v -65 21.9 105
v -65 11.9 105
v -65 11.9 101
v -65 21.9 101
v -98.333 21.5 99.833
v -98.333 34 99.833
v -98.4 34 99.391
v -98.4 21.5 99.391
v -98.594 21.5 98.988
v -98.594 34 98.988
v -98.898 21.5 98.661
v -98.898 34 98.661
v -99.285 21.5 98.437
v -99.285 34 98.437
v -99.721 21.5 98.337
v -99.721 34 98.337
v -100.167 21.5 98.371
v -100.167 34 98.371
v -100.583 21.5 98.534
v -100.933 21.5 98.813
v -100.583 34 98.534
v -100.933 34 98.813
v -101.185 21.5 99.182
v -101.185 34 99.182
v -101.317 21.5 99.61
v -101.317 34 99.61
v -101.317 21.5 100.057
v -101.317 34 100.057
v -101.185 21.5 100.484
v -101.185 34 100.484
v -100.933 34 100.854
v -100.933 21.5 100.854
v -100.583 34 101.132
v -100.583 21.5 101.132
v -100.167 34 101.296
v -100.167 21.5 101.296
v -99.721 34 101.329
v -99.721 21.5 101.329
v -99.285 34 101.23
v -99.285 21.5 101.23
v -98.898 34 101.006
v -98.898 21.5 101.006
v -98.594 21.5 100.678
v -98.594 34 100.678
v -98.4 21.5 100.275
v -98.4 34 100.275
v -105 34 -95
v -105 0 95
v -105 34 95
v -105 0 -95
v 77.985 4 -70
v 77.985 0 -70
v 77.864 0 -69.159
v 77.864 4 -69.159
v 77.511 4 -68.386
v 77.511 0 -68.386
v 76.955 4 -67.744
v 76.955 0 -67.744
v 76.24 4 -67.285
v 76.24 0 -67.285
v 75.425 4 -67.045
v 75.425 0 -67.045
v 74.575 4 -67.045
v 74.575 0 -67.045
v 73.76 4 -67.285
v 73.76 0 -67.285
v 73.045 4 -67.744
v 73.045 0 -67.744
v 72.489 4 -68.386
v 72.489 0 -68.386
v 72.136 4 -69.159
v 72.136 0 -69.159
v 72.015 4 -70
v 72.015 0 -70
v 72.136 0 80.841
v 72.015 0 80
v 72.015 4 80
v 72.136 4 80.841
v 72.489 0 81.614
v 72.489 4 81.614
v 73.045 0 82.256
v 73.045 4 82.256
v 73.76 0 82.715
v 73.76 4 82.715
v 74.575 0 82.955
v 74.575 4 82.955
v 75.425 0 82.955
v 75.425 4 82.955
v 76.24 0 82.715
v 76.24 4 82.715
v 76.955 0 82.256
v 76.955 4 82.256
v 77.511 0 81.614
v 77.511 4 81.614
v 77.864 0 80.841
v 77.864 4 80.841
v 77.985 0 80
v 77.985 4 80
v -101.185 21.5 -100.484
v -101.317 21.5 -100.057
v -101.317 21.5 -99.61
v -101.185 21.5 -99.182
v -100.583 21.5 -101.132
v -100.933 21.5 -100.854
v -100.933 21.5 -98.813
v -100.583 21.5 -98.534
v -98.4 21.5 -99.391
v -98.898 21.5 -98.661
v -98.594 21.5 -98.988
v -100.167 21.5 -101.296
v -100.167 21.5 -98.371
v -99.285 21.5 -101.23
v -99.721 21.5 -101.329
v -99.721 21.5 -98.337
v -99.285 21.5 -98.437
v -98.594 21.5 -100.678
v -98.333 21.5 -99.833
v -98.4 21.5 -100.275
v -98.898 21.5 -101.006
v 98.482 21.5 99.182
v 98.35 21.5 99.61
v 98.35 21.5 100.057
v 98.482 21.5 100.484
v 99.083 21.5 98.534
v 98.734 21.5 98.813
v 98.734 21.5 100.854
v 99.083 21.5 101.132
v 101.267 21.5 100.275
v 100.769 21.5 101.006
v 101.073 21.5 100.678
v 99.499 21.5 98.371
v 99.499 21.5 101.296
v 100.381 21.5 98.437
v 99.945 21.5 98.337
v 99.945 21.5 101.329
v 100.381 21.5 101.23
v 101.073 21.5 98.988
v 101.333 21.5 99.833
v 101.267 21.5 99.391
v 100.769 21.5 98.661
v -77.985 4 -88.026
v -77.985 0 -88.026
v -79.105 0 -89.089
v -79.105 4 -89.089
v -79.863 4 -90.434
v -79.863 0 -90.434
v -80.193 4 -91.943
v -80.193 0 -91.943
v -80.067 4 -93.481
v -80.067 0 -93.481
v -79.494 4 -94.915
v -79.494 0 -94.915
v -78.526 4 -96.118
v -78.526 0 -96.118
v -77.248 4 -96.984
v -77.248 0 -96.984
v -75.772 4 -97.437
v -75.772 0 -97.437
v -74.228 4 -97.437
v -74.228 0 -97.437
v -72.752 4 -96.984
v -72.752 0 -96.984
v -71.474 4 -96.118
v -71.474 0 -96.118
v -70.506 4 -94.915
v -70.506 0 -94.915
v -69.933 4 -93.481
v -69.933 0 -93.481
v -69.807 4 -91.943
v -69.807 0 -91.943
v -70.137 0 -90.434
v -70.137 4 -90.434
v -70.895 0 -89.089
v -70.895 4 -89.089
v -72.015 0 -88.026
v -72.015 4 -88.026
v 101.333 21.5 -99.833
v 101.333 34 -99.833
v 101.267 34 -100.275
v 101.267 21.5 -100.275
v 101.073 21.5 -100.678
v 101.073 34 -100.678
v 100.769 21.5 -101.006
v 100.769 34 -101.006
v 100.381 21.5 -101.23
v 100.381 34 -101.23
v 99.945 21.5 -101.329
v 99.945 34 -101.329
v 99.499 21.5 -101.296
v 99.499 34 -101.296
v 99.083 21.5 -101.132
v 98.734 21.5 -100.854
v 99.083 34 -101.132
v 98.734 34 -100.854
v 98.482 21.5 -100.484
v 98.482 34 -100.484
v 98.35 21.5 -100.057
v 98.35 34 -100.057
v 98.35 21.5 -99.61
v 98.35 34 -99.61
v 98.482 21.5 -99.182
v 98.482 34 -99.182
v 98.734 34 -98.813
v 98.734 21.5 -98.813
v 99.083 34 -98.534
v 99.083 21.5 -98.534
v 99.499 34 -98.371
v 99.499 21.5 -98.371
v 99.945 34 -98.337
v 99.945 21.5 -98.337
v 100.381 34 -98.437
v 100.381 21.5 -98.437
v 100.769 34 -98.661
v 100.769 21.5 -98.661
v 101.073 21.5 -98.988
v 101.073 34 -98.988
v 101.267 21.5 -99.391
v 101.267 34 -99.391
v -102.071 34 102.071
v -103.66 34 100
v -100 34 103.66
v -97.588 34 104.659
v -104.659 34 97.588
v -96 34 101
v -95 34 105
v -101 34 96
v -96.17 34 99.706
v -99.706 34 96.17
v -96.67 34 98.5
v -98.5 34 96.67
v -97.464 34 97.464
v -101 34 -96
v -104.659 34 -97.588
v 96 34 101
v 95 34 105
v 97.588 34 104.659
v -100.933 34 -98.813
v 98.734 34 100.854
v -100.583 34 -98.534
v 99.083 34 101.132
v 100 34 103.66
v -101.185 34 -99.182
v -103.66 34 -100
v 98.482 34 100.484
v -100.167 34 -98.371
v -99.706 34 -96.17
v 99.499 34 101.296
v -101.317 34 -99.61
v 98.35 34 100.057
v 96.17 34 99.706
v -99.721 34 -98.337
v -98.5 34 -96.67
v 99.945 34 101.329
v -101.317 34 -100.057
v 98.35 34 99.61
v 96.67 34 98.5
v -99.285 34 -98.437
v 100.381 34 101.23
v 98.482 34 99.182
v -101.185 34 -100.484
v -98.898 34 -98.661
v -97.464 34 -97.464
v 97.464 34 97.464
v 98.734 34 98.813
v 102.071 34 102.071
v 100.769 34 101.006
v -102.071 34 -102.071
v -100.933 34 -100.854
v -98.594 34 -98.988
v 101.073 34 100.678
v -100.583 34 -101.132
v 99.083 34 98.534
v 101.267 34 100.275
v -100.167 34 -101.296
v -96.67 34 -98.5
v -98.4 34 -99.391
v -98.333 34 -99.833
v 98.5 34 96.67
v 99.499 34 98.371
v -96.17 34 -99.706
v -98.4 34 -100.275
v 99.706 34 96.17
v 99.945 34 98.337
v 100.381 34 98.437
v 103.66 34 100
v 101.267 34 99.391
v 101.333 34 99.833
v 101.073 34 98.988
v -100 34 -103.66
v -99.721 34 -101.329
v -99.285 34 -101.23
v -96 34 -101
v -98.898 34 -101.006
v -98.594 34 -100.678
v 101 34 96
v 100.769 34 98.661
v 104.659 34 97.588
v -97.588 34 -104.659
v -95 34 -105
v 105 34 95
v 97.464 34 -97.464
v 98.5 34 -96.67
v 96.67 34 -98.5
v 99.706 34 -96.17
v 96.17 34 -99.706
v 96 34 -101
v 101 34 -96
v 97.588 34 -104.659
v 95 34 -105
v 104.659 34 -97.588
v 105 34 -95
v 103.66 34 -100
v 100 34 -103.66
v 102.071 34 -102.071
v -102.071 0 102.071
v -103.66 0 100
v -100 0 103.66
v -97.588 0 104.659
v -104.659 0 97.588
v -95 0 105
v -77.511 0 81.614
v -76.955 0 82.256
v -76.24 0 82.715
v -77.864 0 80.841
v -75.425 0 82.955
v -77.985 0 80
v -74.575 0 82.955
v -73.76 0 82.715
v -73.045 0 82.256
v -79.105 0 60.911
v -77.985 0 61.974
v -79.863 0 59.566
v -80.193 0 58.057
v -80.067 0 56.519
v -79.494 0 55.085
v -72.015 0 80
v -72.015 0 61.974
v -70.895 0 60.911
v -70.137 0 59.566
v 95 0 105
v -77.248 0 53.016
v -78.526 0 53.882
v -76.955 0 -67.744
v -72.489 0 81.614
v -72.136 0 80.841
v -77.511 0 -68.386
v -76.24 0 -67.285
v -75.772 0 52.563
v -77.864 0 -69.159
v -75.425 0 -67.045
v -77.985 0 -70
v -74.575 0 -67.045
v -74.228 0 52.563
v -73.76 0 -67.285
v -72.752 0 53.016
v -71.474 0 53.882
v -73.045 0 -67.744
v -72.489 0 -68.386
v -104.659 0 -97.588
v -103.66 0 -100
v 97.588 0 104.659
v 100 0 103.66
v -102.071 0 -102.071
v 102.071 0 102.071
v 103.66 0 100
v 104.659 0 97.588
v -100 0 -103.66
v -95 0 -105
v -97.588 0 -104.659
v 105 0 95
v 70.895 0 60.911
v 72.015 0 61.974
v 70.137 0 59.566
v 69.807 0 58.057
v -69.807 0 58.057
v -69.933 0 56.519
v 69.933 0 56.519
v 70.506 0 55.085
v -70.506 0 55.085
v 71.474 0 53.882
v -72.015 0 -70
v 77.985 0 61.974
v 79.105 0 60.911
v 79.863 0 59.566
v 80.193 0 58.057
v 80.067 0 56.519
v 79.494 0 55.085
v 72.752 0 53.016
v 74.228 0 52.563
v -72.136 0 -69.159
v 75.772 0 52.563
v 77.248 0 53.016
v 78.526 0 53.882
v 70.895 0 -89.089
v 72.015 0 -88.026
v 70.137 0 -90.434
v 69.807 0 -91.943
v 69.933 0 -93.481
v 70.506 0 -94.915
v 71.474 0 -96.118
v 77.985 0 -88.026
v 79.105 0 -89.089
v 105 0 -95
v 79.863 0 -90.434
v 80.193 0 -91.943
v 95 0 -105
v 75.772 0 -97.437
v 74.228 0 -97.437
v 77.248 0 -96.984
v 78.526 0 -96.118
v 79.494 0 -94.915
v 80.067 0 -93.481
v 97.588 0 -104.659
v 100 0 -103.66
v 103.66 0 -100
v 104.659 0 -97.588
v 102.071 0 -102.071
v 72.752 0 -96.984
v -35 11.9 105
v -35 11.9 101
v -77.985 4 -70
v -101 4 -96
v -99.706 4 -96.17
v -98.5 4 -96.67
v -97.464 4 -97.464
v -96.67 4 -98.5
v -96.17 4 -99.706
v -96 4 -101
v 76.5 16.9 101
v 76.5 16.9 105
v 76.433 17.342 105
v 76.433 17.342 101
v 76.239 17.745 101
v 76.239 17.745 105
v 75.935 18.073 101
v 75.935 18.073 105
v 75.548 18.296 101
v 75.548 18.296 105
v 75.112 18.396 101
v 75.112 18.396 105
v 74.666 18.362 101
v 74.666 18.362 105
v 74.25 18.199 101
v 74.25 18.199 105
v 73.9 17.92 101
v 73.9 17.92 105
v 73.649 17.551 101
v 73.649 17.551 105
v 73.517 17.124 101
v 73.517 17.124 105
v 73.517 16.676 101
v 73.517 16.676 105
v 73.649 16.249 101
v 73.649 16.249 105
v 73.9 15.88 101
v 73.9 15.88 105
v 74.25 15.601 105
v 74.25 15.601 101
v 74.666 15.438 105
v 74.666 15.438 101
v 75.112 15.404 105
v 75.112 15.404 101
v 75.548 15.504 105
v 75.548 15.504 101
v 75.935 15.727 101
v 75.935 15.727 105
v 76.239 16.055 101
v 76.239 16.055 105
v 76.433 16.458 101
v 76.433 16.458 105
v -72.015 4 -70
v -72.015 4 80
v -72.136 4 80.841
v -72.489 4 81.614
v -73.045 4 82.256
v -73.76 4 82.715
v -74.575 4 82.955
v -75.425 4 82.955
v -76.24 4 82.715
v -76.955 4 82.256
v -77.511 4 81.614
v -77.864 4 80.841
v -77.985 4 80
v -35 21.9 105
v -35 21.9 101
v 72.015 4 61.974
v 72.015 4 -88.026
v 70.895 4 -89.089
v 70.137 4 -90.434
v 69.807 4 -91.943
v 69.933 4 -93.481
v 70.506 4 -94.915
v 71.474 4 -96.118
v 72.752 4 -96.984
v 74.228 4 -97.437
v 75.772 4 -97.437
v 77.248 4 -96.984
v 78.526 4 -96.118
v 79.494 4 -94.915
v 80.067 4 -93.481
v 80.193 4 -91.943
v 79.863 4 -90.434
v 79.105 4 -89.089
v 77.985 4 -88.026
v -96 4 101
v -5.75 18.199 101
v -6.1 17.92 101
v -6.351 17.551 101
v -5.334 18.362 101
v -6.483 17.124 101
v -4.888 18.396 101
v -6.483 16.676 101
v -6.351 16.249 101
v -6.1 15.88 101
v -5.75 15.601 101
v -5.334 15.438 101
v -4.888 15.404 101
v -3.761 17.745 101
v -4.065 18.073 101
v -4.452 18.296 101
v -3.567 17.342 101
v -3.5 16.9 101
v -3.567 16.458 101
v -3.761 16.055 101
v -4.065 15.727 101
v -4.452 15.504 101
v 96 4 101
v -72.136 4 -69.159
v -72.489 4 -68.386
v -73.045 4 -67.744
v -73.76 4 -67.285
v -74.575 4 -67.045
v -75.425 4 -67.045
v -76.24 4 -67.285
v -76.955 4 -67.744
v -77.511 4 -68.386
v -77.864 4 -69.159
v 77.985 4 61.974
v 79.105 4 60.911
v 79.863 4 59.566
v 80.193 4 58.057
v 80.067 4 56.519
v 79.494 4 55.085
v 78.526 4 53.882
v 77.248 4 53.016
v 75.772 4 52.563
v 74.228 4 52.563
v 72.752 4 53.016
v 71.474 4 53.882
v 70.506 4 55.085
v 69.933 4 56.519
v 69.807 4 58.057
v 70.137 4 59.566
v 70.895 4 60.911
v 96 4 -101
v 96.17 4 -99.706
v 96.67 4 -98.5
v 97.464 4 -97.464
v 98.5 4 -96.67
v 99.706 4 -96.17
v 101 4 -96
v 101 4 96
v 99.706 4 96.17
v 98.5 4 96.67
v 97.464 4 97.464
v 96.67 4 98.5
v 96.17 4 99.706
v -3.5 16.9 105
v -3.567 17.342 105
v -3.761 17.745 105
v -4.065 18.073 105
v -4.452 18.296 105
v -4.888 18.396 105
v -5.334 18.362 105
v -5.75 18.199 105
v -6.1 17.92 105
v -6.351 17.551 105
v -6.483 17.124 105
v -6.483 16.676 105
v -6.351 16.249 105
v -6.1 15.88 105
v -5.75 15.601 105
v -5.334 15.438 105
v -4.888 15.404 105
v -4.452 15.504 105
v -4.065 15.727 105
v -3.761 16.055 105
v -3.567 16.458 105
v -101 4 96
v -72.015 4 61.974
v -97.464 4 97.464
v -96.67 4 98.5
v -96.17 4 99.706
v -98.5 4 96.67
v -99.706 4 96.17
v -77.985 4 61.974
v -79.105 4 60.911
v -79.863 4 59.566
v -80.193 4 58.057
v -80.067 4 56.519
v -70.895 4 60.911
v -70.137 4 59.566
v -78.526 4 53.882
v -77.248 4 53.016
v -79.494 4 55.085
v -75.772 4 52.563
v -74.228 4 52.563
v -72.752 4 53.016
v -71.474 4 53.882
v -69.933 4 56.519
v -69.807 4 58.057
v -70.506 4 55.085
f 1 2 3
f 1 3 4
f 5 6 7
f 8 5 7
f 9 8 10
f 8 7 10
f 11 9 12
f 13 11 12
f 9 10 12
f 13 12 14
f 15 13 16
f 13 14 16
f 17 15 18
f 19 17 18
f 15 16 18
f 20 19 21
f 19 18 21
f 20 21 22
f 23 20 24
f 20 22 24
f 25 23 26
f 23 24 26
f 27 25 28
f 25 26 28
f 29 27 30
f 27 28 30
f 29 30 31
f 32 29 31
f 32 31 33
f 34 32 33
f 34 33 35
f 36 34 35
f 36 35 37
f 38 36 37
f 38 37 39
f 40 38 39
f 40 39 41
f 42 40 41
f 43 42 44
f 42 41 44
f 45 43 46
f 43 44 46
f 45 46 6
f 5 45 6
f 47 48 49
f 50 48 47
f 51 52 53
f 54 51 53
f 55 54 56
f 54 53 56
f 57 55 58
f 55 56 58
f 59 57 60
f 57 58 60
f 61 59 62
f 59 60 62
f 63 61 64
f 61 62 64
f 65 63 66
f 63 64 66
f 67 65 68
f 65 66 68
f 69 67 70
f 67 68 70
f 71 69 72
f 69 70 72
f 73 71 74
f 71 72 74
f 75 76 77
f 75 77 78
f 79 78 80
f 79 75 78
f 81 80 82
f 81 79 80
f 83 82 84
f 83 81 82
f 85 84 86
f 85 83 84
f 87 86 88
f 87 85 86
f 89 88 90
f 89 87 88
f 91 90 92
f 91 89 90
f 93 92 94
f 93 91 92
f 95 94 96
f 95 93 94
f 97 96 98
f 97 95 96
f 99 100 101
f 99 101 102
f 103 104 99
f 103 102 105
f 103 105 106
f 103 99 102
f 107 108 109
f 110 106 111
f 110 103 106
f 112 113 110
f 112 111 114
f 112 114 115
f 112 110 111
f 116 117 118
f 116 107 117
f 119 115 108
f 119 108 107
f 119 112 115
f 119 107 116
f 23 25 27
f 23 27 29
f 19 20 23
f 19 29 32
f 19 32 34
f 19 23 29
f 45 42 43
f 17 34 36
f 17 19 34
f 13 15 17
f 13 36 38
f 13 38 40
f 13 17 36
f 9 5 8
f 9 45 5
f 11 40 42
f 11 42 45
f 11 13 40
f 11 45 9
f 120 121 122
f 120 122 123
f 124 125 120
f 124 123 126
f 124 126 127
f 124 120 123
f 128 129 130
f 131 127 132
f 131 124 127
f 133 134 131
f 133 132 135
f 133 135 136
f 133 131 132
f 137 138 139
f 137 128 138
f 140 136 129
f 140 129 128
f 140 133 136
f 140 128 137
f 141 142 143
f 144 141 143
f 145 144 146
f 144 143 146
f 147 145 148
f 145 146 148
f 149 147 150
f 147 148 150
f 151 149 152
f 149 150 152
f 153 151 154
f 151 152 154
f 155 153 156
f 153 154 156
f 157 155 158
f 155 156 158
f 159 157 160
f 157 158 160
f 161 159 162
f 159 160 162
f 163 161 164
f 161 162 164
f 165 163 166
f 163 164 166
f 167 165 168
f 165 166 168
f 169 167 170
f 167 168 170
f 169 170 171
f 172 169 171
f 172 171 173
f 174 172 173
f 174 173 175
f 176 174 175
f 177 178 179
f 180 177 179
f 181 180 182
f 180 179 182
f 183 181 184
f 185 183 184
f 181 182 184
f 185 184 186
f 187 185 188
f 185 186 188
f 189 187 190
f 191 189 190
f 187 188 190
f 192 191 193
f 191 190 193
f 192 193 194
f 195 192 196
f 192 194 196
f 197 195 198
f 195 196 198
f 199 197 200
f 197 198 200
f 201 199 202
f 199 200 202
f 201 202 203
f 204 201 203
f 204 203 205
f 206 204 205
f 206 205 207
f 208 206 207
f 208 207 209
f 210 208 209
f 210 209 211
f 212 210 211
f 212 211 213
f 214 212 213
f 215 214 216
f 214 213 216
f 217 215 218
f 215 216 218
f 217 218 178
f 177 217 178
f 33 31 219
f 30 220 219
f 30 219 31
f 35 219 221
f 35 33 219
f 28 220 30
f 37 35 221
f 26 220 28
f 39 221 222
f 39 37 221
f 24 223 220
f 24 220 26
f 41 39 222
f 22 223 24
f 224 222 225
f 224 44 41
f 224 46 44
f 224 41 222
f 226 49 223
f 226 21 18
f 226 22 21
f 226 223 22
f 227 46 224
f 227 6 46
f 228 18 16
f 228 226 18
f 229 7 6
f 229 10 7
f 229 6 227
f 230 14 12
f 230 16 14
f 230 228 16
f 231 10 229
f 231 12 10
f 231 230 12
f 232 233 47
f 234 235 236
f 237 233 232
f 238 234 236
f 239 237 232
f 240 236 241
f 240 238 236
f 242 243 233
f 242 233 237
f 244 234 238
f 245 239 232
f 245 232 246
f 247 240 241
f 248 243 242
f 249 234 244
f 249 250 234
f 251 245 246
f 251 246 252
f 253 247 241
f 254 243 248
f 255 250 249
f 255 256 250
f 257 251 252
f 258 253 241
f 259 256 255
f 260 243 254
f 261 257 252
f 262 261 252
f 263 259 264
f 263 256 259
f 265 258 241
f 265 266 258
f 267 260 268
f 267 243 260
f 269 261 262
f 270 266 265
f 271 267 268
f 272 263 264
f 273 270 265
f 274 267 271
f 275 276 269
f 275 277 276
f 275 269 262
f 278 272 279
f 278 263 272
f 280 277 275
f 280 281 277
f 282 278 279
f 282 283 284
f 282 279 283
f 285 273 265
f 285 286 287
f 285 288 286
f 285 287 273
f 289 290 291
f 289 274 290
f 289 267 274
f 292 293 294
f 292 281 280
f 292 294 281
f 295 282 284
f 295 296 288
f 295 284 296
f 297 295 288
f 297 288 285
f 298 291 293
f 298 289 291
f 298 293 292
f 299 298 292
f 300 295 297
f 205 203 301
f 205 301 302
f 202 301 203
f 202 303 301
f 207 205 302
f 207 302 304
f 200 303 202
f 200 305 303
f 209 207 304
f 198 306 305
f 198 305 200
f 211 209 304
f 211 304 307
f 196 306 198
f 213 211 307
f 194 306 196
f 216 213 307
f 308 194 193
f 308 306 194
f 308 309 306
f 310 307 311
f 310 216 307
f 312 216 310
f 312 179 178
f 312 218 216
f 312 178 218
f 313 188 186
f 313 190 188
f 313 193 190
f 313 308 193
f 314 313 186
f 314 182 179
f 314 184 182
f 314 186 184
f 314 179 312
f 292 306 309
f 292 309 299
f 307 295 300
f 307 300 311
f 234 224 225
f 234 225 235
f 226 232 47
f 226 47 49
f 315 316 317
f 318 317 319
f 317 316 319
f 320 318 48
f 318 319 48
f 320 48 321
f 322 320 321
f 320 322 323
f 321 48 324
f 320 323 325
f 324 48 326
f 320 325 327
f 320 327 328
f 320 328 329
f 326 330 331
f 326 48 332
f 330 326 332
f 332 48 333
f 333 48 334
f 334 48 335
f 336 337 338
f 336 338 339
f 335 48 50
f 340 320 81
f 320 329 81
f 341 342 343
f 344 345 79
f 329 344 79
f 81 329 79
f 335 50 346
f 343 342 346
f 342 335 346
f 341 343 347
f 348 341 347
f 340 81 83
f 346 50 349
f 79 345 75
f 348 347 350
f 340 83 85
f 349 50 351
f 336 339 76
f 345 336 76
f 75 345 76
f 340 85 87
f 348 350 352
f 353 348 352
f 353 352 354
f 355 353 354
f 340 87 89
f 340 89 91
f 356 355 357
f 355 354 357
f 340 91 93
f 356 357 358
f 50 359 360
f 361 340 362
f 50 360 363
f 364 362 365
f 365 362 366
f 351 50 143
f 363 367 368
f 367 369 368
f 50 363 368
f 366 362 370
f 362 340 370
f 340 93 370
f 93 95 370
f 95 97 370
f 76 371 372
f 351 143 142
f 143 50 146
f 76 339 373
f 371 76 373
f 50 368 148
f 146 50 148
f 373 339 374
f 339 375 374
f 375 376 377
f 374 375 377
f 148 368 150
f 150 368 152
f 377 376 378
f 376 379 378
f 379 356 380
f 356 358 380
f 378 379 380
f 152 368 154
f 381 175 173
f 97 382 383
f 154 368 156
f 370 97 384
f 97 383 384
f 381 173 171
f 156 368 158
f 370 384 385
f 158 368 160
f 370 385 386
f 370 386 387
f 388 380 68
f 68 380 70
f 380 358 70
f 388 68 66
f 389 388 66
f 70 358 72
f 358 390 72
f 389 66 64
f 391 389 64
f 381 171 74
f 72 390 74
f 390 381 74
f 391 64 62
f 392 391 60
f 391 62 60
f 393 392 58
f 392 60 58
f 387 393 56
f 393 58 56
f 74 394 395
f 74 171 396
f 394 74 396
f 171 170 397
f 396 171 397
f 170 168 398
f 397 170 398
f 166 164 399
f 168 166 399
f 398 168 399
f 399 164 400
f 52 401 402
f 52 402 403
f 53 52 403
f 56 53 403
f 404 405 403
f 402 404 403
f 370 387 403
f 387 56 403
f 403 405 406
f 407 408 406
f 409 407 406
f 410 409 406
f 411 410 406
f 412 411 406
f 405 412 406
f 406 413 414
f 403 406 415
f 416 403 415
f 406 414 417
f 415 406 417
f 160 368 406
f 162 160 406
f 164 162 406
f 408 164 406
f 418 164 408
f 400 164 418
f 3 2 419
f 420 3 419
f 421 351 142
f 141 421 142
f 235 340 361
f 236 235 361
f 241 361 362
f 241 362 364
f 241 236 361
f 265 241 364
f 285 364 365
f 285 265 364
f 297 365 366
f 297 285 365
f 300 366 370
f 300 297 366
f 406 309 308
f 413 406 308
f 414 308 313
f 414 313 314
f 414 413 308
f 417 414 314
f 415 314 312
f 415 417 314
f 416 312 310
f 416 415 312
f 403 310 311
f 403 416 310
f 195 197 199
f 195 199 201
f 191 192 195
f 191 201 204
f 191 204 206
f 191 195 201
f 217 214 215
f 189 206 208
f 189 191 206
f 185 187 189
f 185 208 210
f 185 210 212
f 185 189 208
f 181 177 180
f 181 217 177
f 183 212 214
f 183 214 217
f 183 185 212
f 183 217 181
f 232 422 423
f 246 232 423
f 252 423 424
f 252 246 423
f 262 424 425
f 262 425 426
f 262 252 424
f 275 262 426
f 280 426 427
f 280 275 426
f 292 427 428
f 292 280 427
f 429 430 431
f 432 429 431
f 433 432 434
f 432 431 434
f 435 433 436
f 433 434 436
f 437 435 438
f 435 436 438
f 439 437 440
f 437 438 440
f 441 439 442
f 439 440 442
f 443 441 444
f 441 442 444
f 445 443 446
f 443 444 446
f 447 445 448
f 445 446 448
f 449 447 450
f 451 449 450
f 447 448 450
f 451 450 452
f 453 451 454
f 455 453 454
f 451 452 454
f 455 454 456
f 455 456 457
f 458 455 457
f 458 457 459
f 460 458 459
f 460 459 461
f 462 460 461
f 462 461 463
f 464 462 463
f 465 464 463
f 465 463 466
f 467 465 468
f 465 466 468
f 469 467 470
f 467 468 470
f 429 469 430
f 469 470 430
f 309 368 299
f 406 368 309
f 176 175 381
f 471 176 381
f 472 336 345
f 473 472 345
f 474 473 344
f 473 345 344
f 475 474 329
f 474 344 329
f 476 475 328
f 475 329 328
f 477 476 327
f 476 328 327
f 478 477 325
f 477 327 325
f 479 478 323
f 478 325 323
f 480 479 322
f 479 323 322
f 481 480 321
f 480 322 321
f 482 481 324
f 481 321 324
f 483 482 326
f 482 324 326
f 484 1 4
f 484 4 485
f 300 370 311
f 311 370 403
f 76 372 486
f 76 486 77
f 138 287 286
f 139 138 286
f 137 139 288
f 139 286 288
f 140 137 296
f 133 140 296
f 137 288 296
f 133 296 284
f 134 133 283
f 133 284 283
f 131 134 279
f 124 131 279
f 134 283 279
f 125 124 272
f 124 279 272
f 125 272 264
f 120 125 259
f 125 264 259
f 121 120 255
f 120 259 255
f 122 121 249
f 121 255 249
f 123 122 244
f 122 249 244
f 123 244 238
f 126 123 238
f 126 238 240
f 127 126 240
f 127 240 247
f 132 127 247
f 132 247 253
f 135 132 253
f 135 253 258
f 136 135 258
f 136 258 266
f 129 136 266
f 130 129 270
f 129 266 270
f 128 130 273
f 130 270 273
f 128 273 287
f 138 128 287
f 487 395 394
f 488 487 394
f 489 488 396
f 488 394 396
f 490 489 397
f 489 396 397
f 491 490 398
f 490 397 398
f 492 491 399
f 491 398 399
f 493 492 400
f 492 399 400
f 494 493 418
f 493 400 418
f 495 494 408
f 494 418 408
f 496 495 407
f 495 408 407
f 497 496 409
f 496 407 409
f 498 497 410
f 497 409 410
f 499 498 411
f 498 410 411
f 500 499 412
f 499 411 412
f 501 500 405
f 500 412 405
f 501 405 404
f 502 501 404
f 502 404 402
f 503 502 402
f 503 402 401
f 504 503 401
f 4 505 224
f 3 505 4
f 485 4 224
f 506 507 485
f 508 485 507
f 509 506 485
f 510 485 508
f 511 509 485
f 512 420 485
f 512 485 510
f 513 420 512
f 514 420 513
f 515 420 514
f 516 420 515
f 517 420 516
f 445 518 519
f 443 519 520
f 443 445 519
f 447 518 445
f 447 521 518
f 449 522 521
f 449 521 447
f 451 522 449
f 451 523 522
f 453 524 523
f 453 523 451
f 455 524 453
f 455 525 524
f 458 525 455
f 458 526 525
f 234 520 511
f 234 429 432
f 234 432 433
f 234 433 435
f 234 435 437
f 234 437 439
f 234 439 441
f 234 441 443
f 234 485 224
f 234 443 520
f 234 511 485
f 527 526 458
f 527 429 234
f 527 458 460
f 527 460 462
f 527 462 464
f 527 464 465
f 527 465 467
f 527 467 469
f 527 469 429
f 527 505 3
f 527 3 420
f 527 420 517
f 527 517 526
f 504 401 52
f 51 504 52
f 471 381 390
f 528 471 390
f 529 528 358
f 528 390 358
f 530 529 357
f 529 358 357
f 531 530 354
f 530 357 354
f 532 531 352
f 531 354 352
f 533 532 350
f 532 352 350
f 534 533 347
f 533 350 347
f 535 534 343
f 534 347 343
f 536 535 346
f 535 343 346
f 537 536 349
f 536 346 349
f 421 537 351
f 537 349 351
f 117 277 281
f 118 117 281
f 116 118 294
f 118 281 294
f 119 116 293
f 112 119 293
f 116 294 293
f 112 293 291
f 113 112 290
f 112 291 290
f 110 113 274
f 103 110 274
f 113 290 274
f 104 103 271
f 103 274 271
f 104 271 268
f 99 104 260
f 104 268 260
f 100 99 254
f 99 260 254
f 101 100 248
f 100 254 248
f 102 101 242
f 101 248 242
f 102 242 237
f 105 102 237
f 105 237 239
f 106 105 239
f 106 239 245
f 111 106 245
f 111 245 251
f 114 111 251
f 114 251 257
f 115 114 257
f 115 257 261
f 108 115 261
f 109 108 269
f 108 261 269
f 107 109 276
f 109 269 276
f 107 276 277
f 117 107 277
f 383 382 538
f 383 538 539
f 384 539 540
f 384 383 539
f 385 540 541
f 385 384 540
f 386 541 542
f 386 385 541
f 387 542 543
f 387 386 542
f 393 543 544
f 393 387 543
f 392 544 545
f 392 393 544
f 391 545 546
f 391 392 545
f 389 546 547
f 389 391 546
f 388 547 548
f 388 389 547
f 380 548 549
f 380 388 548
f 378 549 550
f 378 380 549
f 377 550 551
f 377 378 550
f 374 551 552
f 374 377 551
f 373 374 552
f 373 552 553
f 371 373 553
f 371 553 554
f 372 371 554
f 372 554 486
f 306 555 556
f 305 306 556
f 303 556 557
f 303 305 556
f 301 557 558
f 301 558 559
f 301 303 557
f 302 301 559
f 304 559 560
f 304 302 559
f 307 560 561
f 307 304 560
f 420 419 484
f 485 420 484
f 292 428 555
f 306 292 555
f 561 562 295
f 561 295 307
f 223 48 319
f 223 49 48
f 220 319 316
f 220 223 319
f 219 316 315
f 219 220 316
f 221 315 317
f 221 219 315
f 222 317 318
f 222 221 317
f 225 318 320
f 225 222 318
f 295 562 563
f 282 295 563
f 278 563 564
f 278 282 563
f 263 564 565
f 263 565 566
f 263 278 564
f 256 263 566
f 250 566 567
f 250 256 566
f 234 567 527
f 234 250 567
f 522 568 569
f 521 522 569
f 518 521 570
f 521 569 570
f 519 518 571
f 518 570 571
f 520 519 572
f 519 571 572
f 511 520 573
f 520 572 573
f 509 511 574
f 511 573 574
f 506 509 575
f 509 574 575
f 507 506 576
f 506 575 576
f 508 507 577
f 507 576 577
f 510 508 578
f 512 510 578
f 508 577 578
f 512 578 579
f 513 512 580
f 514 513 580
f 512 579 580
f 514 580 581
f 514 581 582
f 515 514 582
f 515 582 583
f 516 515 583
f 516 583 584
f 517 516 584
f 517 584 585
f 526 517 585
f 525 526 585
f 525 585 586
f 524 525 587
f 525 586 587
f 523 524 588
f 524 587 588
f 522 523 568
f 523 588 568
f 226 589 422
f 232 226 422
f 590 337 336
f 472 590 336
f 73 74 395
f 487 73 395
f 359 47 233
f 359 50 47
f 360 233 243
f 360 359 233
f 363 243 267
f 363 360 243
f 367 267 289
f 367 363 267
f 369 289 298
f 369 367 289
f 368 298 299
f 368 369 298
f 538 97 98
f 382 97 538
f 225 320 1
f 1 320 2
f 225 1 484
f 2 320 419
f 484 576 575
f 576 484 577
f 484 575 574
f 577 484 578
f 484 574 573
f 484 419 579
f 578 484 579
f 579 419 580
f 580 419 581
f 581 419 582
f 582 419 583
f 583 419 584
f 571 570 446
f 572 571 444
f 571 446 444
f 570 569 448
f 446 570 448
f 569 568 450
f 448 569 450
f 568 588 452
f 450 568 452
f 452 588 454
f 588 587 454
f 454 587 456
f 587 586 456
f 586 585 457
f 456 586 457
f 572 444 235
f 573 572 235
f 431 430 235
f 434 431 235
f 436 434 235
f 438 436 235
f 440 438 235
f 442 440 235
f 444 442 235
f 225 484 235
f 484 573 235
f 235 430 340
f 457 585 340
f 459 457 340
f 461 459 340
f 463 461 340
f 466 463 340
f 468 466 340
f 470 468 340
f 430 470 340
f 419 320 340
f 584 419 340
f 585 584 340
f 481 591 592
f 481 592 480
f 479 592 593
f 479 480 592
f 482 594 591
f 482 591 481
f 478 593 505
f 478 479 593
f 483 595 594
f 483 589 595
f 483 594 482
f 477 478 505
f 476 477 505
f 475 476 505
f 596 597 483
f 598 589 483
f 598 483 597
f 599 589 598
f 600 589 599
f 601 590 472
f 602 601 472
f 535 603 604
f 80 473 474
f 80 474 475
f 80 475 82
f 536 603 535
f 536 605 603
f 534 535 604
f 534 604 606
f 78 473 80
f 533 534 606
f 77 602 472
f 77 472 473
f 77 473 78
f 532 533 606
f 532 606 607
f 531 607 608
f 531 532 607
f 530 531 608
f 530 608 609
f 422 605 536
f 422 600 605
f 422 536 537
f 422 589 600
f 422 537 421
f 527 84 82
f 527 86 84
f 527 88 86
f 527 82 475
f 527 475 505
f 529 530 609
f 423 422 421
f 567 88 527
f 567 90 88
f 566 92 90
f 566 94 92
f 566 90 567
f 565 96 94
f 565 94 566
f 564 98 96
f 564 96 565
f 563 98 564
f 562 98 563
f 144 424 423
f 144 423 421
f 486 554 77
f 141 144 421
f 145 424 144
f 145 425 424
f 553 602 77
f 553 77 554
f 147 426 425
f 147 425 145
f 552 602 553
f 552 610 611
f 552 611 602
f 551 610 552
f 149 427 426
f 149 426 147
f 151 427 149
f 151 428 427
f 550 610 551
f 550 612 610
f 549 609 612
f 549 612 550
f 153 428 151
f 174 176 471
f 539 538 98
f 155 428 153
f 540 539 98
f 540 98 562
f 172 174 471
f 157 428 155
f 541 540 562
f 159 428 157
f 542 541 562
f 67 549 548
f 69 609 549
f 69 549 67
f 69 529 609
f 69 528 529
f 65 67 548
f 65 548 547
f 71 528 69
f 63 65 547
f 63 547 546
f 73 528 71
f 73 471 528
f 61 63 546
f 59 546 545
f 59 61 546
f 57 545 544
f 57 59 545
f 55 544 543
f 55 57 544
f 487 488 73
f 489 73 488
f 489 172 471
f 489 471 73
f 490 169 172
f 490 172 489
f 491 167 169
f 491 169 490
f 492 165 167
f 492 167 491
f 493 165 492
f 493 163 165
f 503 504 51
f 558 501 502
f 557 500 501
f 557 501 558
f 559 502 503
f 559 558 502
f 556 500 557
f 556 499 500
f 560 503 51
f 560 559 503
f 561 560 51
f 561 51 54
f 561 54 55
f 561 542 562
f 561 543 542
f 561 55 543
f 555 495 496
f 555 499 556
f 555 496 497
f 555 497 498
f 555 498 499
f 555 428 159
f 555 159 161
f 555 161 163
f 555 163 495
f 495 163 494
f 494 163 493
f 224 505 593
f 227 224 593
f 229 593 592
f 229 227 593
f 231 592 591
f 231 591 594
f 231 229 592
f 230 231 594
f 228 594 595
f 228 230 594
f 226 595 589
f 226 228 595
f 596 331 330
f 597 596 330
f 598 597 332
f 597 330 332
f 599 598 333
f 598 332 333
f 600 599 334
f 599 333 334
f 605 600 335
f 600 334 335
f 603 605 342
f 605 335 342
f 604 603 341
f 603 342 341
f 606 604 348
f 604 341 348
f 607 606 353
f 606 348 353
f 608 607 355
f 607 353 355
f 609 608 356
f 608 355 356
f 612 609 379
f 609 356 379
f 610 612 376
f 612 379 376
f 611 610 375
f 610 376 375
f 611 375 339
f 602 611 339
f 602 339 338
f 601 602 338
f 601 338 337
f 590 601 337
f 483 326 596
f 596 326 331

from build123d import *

# Parameters (mm, degrees)
SKETCH1_W            = 210
SKETCH1_H            = 210
BASE_DEPTH           = 4
WALLS_START          = 4
SKETCH1_3_W          = 210
SKETCH1_3_H          = 210
SKETCH1_3_W_2        = 202
SKETCH1_3_H_2        = 202
WALLS_DEPTH          = 30
SCREWMOUNTS_DEPTH    = 30
SKETCH2_5_R          = 1.5
SCREWHOLES_DEPTH     = 12.5
ROUNDEDCORNERS_R     = 10
BACKHOLEMOUNTS_DEPTH = 4
SKETCH4_R            = 1.5
SKETCH4_W            = 30
SKETCH4_H            = 10
BATTERYPACK_DEPTH    = 4


with BuildPart() as part:
    # Sketch1 → Base (new body)
    with BuildSketch(Plane(origin=(0, 0, 0), x_dir=(1, 0, 0), z_dir=(0, 1, 0))):
        Rectangle(SKETCH1_W, SKETCH1_H)
    extrude(amount=BASE_DEPTH)

    # Sketch1<3> → Walls (add)
    with BuildSketch(Plane(origin=(0, 0, 0), x_dir=(1, 0, 0), z_dir=(0, 1, 0)).offset(WALLS_START)):
        Rectangle(SKETCH1_3_W, SKETCH1_3_H)
        Rectangle(SKETCH1_3_W_2, SKETCH1_3_H_2, mode=Mode.SUBTRACT)
    extrude(amount=WALLS_DEPTH)

    # Sketch2 → ScrewMounts (add)
    with BuildSketch(Plane(origin=(0, 34, 0), x_dir=(1, 0, 0), z_dir=(0, 1, 0))):
        with BuildLine():
            Line((-101, 101), (-101, 96))
            ThreePointArc((-101, 96), (-97.464466094, 97.464466094), (-96, 101))
            Line((-96, 101), (-101, 101))
        make_face()
        with BuildLine():
            Line((-101, -101), (-96, -101))
            ThreePointArc((-96, -101), (-97.464466094, -97.464466094), (-101, -96))
            Line((-101, -96), (-101, -101))
        make_face()
        with BuildLine():
            Line((101, 101), (96, 101))
            ThreePointArc((96, 101), (97.464466094, 97.464466094), (101, 96))
            Line((101, 96), (101, 101))
        make_face()
        with BuildLine():
            Line((101, -101), (101, -96))
            ThreePointArc((101, -96), (97.464466094, -97.464466094), (96, -101))
            Line((96, -101), (101, -101))
        make_face()
    extrude(amount=-SCREWMOUNTS_DEPTH)

    # Sketch2<5> → ScrewHoles (cut)
    with BuildSketch(Plane(origin=(0, 34, 0), x_dir=(1, 0, 0), z_dir=(0, 1, 0))):
        with Locations((-99.833273811, 99.833273811)):
            Circle(SKETCH2_5_R)
        with Locations((-99.833273811, -99.833273811)):
            Circle(SKETCH2_5_R)
        with Locations((99.833273811, 99.833273811)):
            Circle(SKETCH2_5_R)
        with Locations((99.833273811, -99.833273811)):
            Circle(SKETCH2_5_R)
    extrude(amount=-SCREWHOLES_DEPTH, mode=Mode.SUBTRACT)

    # RoundedCorners
    roundedcorners_edges = [part.edges().sort_by_distance(p)[0] for p in [
        (-105, 17, 105),
        (105, 17, 105),
        (105, 17, -105),
        (-105, 17, -105),
    ]]
    fillet(roundedcorners_edges, radius=ROUNDEDCORNERS_R)

    # Sketch3 → BackHoleMounts (cut)
    with BuildSketch(Plane.XZ):
        with BuildLine():
            Line((-77.985, 80), (-77.985, 61.974012195))
            ThreePointArc((-77.985, 61.974012195), (-75, 52.505), (-72.015, 61.974012195))
            Line((-72.015, 61.974012195), (-72.015, 80))
            ThreePointArc((-72.015, 80), (-75, 82.985), (-77.985, 80))
        make_face()
        with BuildLine():
            Line((77.985, 80), (77.985, 61.974012195))
            ThreePointArc((77.985, 61.974012195), (75, 52.505), (72.015, 61.974012195))
            Line((72.015, 61.974012195), (72.015, 80))
            ThreePointArc((72.015, 80), (75, 82.985), (77.985, 80))
        make_face()
        with BuildLine():
            Line((72.015, -70), (72.015, -88.025987805))
            ThreePointArc((72.015, -88.025987805), (75, -97.495), (77.985, -88.025987805))
            Line((77.985, -88.025987805), (77.985, -70))
            ThreePointArc((77.985, -70), (75, -67.015), (72.015, -70))
        make_face()
        with BuildLine():
            Line((-77.985, -70), (-77.985, -88.025987805))
            ThreePointArc((-77.985, -88.025987805), (-75, -97.495), (-72.015, -88.025987805))
            Line((-72.015, -88.025987805), (-72.015, -70))
            ThreePointArc((-72.015, -70), (-75, -67.015), (-77.985, -70))
        make_face()
    extrude(amount=-BACKHOLEMOUNTS_DEPTH, mode=Mode.SUBTRACT)

    # Sketch4 → BatteryPack (cut)
    with BuildSketch(Plane.XY.offset(105)):
        with Locations((75, 16.9)):
            Circle(SKETCH4_R)
        with Locations((-5, 16.9)):
            Circle(SKETCH4_R)
        with Locations((-50, 16.9)):
            Rectangle(SKETCH4_W, SKETCH4_H)
    extrude(amount=-BATTERYPACK_DEPTH, mode=Mode.SUBTRACT)


solid = part.part
